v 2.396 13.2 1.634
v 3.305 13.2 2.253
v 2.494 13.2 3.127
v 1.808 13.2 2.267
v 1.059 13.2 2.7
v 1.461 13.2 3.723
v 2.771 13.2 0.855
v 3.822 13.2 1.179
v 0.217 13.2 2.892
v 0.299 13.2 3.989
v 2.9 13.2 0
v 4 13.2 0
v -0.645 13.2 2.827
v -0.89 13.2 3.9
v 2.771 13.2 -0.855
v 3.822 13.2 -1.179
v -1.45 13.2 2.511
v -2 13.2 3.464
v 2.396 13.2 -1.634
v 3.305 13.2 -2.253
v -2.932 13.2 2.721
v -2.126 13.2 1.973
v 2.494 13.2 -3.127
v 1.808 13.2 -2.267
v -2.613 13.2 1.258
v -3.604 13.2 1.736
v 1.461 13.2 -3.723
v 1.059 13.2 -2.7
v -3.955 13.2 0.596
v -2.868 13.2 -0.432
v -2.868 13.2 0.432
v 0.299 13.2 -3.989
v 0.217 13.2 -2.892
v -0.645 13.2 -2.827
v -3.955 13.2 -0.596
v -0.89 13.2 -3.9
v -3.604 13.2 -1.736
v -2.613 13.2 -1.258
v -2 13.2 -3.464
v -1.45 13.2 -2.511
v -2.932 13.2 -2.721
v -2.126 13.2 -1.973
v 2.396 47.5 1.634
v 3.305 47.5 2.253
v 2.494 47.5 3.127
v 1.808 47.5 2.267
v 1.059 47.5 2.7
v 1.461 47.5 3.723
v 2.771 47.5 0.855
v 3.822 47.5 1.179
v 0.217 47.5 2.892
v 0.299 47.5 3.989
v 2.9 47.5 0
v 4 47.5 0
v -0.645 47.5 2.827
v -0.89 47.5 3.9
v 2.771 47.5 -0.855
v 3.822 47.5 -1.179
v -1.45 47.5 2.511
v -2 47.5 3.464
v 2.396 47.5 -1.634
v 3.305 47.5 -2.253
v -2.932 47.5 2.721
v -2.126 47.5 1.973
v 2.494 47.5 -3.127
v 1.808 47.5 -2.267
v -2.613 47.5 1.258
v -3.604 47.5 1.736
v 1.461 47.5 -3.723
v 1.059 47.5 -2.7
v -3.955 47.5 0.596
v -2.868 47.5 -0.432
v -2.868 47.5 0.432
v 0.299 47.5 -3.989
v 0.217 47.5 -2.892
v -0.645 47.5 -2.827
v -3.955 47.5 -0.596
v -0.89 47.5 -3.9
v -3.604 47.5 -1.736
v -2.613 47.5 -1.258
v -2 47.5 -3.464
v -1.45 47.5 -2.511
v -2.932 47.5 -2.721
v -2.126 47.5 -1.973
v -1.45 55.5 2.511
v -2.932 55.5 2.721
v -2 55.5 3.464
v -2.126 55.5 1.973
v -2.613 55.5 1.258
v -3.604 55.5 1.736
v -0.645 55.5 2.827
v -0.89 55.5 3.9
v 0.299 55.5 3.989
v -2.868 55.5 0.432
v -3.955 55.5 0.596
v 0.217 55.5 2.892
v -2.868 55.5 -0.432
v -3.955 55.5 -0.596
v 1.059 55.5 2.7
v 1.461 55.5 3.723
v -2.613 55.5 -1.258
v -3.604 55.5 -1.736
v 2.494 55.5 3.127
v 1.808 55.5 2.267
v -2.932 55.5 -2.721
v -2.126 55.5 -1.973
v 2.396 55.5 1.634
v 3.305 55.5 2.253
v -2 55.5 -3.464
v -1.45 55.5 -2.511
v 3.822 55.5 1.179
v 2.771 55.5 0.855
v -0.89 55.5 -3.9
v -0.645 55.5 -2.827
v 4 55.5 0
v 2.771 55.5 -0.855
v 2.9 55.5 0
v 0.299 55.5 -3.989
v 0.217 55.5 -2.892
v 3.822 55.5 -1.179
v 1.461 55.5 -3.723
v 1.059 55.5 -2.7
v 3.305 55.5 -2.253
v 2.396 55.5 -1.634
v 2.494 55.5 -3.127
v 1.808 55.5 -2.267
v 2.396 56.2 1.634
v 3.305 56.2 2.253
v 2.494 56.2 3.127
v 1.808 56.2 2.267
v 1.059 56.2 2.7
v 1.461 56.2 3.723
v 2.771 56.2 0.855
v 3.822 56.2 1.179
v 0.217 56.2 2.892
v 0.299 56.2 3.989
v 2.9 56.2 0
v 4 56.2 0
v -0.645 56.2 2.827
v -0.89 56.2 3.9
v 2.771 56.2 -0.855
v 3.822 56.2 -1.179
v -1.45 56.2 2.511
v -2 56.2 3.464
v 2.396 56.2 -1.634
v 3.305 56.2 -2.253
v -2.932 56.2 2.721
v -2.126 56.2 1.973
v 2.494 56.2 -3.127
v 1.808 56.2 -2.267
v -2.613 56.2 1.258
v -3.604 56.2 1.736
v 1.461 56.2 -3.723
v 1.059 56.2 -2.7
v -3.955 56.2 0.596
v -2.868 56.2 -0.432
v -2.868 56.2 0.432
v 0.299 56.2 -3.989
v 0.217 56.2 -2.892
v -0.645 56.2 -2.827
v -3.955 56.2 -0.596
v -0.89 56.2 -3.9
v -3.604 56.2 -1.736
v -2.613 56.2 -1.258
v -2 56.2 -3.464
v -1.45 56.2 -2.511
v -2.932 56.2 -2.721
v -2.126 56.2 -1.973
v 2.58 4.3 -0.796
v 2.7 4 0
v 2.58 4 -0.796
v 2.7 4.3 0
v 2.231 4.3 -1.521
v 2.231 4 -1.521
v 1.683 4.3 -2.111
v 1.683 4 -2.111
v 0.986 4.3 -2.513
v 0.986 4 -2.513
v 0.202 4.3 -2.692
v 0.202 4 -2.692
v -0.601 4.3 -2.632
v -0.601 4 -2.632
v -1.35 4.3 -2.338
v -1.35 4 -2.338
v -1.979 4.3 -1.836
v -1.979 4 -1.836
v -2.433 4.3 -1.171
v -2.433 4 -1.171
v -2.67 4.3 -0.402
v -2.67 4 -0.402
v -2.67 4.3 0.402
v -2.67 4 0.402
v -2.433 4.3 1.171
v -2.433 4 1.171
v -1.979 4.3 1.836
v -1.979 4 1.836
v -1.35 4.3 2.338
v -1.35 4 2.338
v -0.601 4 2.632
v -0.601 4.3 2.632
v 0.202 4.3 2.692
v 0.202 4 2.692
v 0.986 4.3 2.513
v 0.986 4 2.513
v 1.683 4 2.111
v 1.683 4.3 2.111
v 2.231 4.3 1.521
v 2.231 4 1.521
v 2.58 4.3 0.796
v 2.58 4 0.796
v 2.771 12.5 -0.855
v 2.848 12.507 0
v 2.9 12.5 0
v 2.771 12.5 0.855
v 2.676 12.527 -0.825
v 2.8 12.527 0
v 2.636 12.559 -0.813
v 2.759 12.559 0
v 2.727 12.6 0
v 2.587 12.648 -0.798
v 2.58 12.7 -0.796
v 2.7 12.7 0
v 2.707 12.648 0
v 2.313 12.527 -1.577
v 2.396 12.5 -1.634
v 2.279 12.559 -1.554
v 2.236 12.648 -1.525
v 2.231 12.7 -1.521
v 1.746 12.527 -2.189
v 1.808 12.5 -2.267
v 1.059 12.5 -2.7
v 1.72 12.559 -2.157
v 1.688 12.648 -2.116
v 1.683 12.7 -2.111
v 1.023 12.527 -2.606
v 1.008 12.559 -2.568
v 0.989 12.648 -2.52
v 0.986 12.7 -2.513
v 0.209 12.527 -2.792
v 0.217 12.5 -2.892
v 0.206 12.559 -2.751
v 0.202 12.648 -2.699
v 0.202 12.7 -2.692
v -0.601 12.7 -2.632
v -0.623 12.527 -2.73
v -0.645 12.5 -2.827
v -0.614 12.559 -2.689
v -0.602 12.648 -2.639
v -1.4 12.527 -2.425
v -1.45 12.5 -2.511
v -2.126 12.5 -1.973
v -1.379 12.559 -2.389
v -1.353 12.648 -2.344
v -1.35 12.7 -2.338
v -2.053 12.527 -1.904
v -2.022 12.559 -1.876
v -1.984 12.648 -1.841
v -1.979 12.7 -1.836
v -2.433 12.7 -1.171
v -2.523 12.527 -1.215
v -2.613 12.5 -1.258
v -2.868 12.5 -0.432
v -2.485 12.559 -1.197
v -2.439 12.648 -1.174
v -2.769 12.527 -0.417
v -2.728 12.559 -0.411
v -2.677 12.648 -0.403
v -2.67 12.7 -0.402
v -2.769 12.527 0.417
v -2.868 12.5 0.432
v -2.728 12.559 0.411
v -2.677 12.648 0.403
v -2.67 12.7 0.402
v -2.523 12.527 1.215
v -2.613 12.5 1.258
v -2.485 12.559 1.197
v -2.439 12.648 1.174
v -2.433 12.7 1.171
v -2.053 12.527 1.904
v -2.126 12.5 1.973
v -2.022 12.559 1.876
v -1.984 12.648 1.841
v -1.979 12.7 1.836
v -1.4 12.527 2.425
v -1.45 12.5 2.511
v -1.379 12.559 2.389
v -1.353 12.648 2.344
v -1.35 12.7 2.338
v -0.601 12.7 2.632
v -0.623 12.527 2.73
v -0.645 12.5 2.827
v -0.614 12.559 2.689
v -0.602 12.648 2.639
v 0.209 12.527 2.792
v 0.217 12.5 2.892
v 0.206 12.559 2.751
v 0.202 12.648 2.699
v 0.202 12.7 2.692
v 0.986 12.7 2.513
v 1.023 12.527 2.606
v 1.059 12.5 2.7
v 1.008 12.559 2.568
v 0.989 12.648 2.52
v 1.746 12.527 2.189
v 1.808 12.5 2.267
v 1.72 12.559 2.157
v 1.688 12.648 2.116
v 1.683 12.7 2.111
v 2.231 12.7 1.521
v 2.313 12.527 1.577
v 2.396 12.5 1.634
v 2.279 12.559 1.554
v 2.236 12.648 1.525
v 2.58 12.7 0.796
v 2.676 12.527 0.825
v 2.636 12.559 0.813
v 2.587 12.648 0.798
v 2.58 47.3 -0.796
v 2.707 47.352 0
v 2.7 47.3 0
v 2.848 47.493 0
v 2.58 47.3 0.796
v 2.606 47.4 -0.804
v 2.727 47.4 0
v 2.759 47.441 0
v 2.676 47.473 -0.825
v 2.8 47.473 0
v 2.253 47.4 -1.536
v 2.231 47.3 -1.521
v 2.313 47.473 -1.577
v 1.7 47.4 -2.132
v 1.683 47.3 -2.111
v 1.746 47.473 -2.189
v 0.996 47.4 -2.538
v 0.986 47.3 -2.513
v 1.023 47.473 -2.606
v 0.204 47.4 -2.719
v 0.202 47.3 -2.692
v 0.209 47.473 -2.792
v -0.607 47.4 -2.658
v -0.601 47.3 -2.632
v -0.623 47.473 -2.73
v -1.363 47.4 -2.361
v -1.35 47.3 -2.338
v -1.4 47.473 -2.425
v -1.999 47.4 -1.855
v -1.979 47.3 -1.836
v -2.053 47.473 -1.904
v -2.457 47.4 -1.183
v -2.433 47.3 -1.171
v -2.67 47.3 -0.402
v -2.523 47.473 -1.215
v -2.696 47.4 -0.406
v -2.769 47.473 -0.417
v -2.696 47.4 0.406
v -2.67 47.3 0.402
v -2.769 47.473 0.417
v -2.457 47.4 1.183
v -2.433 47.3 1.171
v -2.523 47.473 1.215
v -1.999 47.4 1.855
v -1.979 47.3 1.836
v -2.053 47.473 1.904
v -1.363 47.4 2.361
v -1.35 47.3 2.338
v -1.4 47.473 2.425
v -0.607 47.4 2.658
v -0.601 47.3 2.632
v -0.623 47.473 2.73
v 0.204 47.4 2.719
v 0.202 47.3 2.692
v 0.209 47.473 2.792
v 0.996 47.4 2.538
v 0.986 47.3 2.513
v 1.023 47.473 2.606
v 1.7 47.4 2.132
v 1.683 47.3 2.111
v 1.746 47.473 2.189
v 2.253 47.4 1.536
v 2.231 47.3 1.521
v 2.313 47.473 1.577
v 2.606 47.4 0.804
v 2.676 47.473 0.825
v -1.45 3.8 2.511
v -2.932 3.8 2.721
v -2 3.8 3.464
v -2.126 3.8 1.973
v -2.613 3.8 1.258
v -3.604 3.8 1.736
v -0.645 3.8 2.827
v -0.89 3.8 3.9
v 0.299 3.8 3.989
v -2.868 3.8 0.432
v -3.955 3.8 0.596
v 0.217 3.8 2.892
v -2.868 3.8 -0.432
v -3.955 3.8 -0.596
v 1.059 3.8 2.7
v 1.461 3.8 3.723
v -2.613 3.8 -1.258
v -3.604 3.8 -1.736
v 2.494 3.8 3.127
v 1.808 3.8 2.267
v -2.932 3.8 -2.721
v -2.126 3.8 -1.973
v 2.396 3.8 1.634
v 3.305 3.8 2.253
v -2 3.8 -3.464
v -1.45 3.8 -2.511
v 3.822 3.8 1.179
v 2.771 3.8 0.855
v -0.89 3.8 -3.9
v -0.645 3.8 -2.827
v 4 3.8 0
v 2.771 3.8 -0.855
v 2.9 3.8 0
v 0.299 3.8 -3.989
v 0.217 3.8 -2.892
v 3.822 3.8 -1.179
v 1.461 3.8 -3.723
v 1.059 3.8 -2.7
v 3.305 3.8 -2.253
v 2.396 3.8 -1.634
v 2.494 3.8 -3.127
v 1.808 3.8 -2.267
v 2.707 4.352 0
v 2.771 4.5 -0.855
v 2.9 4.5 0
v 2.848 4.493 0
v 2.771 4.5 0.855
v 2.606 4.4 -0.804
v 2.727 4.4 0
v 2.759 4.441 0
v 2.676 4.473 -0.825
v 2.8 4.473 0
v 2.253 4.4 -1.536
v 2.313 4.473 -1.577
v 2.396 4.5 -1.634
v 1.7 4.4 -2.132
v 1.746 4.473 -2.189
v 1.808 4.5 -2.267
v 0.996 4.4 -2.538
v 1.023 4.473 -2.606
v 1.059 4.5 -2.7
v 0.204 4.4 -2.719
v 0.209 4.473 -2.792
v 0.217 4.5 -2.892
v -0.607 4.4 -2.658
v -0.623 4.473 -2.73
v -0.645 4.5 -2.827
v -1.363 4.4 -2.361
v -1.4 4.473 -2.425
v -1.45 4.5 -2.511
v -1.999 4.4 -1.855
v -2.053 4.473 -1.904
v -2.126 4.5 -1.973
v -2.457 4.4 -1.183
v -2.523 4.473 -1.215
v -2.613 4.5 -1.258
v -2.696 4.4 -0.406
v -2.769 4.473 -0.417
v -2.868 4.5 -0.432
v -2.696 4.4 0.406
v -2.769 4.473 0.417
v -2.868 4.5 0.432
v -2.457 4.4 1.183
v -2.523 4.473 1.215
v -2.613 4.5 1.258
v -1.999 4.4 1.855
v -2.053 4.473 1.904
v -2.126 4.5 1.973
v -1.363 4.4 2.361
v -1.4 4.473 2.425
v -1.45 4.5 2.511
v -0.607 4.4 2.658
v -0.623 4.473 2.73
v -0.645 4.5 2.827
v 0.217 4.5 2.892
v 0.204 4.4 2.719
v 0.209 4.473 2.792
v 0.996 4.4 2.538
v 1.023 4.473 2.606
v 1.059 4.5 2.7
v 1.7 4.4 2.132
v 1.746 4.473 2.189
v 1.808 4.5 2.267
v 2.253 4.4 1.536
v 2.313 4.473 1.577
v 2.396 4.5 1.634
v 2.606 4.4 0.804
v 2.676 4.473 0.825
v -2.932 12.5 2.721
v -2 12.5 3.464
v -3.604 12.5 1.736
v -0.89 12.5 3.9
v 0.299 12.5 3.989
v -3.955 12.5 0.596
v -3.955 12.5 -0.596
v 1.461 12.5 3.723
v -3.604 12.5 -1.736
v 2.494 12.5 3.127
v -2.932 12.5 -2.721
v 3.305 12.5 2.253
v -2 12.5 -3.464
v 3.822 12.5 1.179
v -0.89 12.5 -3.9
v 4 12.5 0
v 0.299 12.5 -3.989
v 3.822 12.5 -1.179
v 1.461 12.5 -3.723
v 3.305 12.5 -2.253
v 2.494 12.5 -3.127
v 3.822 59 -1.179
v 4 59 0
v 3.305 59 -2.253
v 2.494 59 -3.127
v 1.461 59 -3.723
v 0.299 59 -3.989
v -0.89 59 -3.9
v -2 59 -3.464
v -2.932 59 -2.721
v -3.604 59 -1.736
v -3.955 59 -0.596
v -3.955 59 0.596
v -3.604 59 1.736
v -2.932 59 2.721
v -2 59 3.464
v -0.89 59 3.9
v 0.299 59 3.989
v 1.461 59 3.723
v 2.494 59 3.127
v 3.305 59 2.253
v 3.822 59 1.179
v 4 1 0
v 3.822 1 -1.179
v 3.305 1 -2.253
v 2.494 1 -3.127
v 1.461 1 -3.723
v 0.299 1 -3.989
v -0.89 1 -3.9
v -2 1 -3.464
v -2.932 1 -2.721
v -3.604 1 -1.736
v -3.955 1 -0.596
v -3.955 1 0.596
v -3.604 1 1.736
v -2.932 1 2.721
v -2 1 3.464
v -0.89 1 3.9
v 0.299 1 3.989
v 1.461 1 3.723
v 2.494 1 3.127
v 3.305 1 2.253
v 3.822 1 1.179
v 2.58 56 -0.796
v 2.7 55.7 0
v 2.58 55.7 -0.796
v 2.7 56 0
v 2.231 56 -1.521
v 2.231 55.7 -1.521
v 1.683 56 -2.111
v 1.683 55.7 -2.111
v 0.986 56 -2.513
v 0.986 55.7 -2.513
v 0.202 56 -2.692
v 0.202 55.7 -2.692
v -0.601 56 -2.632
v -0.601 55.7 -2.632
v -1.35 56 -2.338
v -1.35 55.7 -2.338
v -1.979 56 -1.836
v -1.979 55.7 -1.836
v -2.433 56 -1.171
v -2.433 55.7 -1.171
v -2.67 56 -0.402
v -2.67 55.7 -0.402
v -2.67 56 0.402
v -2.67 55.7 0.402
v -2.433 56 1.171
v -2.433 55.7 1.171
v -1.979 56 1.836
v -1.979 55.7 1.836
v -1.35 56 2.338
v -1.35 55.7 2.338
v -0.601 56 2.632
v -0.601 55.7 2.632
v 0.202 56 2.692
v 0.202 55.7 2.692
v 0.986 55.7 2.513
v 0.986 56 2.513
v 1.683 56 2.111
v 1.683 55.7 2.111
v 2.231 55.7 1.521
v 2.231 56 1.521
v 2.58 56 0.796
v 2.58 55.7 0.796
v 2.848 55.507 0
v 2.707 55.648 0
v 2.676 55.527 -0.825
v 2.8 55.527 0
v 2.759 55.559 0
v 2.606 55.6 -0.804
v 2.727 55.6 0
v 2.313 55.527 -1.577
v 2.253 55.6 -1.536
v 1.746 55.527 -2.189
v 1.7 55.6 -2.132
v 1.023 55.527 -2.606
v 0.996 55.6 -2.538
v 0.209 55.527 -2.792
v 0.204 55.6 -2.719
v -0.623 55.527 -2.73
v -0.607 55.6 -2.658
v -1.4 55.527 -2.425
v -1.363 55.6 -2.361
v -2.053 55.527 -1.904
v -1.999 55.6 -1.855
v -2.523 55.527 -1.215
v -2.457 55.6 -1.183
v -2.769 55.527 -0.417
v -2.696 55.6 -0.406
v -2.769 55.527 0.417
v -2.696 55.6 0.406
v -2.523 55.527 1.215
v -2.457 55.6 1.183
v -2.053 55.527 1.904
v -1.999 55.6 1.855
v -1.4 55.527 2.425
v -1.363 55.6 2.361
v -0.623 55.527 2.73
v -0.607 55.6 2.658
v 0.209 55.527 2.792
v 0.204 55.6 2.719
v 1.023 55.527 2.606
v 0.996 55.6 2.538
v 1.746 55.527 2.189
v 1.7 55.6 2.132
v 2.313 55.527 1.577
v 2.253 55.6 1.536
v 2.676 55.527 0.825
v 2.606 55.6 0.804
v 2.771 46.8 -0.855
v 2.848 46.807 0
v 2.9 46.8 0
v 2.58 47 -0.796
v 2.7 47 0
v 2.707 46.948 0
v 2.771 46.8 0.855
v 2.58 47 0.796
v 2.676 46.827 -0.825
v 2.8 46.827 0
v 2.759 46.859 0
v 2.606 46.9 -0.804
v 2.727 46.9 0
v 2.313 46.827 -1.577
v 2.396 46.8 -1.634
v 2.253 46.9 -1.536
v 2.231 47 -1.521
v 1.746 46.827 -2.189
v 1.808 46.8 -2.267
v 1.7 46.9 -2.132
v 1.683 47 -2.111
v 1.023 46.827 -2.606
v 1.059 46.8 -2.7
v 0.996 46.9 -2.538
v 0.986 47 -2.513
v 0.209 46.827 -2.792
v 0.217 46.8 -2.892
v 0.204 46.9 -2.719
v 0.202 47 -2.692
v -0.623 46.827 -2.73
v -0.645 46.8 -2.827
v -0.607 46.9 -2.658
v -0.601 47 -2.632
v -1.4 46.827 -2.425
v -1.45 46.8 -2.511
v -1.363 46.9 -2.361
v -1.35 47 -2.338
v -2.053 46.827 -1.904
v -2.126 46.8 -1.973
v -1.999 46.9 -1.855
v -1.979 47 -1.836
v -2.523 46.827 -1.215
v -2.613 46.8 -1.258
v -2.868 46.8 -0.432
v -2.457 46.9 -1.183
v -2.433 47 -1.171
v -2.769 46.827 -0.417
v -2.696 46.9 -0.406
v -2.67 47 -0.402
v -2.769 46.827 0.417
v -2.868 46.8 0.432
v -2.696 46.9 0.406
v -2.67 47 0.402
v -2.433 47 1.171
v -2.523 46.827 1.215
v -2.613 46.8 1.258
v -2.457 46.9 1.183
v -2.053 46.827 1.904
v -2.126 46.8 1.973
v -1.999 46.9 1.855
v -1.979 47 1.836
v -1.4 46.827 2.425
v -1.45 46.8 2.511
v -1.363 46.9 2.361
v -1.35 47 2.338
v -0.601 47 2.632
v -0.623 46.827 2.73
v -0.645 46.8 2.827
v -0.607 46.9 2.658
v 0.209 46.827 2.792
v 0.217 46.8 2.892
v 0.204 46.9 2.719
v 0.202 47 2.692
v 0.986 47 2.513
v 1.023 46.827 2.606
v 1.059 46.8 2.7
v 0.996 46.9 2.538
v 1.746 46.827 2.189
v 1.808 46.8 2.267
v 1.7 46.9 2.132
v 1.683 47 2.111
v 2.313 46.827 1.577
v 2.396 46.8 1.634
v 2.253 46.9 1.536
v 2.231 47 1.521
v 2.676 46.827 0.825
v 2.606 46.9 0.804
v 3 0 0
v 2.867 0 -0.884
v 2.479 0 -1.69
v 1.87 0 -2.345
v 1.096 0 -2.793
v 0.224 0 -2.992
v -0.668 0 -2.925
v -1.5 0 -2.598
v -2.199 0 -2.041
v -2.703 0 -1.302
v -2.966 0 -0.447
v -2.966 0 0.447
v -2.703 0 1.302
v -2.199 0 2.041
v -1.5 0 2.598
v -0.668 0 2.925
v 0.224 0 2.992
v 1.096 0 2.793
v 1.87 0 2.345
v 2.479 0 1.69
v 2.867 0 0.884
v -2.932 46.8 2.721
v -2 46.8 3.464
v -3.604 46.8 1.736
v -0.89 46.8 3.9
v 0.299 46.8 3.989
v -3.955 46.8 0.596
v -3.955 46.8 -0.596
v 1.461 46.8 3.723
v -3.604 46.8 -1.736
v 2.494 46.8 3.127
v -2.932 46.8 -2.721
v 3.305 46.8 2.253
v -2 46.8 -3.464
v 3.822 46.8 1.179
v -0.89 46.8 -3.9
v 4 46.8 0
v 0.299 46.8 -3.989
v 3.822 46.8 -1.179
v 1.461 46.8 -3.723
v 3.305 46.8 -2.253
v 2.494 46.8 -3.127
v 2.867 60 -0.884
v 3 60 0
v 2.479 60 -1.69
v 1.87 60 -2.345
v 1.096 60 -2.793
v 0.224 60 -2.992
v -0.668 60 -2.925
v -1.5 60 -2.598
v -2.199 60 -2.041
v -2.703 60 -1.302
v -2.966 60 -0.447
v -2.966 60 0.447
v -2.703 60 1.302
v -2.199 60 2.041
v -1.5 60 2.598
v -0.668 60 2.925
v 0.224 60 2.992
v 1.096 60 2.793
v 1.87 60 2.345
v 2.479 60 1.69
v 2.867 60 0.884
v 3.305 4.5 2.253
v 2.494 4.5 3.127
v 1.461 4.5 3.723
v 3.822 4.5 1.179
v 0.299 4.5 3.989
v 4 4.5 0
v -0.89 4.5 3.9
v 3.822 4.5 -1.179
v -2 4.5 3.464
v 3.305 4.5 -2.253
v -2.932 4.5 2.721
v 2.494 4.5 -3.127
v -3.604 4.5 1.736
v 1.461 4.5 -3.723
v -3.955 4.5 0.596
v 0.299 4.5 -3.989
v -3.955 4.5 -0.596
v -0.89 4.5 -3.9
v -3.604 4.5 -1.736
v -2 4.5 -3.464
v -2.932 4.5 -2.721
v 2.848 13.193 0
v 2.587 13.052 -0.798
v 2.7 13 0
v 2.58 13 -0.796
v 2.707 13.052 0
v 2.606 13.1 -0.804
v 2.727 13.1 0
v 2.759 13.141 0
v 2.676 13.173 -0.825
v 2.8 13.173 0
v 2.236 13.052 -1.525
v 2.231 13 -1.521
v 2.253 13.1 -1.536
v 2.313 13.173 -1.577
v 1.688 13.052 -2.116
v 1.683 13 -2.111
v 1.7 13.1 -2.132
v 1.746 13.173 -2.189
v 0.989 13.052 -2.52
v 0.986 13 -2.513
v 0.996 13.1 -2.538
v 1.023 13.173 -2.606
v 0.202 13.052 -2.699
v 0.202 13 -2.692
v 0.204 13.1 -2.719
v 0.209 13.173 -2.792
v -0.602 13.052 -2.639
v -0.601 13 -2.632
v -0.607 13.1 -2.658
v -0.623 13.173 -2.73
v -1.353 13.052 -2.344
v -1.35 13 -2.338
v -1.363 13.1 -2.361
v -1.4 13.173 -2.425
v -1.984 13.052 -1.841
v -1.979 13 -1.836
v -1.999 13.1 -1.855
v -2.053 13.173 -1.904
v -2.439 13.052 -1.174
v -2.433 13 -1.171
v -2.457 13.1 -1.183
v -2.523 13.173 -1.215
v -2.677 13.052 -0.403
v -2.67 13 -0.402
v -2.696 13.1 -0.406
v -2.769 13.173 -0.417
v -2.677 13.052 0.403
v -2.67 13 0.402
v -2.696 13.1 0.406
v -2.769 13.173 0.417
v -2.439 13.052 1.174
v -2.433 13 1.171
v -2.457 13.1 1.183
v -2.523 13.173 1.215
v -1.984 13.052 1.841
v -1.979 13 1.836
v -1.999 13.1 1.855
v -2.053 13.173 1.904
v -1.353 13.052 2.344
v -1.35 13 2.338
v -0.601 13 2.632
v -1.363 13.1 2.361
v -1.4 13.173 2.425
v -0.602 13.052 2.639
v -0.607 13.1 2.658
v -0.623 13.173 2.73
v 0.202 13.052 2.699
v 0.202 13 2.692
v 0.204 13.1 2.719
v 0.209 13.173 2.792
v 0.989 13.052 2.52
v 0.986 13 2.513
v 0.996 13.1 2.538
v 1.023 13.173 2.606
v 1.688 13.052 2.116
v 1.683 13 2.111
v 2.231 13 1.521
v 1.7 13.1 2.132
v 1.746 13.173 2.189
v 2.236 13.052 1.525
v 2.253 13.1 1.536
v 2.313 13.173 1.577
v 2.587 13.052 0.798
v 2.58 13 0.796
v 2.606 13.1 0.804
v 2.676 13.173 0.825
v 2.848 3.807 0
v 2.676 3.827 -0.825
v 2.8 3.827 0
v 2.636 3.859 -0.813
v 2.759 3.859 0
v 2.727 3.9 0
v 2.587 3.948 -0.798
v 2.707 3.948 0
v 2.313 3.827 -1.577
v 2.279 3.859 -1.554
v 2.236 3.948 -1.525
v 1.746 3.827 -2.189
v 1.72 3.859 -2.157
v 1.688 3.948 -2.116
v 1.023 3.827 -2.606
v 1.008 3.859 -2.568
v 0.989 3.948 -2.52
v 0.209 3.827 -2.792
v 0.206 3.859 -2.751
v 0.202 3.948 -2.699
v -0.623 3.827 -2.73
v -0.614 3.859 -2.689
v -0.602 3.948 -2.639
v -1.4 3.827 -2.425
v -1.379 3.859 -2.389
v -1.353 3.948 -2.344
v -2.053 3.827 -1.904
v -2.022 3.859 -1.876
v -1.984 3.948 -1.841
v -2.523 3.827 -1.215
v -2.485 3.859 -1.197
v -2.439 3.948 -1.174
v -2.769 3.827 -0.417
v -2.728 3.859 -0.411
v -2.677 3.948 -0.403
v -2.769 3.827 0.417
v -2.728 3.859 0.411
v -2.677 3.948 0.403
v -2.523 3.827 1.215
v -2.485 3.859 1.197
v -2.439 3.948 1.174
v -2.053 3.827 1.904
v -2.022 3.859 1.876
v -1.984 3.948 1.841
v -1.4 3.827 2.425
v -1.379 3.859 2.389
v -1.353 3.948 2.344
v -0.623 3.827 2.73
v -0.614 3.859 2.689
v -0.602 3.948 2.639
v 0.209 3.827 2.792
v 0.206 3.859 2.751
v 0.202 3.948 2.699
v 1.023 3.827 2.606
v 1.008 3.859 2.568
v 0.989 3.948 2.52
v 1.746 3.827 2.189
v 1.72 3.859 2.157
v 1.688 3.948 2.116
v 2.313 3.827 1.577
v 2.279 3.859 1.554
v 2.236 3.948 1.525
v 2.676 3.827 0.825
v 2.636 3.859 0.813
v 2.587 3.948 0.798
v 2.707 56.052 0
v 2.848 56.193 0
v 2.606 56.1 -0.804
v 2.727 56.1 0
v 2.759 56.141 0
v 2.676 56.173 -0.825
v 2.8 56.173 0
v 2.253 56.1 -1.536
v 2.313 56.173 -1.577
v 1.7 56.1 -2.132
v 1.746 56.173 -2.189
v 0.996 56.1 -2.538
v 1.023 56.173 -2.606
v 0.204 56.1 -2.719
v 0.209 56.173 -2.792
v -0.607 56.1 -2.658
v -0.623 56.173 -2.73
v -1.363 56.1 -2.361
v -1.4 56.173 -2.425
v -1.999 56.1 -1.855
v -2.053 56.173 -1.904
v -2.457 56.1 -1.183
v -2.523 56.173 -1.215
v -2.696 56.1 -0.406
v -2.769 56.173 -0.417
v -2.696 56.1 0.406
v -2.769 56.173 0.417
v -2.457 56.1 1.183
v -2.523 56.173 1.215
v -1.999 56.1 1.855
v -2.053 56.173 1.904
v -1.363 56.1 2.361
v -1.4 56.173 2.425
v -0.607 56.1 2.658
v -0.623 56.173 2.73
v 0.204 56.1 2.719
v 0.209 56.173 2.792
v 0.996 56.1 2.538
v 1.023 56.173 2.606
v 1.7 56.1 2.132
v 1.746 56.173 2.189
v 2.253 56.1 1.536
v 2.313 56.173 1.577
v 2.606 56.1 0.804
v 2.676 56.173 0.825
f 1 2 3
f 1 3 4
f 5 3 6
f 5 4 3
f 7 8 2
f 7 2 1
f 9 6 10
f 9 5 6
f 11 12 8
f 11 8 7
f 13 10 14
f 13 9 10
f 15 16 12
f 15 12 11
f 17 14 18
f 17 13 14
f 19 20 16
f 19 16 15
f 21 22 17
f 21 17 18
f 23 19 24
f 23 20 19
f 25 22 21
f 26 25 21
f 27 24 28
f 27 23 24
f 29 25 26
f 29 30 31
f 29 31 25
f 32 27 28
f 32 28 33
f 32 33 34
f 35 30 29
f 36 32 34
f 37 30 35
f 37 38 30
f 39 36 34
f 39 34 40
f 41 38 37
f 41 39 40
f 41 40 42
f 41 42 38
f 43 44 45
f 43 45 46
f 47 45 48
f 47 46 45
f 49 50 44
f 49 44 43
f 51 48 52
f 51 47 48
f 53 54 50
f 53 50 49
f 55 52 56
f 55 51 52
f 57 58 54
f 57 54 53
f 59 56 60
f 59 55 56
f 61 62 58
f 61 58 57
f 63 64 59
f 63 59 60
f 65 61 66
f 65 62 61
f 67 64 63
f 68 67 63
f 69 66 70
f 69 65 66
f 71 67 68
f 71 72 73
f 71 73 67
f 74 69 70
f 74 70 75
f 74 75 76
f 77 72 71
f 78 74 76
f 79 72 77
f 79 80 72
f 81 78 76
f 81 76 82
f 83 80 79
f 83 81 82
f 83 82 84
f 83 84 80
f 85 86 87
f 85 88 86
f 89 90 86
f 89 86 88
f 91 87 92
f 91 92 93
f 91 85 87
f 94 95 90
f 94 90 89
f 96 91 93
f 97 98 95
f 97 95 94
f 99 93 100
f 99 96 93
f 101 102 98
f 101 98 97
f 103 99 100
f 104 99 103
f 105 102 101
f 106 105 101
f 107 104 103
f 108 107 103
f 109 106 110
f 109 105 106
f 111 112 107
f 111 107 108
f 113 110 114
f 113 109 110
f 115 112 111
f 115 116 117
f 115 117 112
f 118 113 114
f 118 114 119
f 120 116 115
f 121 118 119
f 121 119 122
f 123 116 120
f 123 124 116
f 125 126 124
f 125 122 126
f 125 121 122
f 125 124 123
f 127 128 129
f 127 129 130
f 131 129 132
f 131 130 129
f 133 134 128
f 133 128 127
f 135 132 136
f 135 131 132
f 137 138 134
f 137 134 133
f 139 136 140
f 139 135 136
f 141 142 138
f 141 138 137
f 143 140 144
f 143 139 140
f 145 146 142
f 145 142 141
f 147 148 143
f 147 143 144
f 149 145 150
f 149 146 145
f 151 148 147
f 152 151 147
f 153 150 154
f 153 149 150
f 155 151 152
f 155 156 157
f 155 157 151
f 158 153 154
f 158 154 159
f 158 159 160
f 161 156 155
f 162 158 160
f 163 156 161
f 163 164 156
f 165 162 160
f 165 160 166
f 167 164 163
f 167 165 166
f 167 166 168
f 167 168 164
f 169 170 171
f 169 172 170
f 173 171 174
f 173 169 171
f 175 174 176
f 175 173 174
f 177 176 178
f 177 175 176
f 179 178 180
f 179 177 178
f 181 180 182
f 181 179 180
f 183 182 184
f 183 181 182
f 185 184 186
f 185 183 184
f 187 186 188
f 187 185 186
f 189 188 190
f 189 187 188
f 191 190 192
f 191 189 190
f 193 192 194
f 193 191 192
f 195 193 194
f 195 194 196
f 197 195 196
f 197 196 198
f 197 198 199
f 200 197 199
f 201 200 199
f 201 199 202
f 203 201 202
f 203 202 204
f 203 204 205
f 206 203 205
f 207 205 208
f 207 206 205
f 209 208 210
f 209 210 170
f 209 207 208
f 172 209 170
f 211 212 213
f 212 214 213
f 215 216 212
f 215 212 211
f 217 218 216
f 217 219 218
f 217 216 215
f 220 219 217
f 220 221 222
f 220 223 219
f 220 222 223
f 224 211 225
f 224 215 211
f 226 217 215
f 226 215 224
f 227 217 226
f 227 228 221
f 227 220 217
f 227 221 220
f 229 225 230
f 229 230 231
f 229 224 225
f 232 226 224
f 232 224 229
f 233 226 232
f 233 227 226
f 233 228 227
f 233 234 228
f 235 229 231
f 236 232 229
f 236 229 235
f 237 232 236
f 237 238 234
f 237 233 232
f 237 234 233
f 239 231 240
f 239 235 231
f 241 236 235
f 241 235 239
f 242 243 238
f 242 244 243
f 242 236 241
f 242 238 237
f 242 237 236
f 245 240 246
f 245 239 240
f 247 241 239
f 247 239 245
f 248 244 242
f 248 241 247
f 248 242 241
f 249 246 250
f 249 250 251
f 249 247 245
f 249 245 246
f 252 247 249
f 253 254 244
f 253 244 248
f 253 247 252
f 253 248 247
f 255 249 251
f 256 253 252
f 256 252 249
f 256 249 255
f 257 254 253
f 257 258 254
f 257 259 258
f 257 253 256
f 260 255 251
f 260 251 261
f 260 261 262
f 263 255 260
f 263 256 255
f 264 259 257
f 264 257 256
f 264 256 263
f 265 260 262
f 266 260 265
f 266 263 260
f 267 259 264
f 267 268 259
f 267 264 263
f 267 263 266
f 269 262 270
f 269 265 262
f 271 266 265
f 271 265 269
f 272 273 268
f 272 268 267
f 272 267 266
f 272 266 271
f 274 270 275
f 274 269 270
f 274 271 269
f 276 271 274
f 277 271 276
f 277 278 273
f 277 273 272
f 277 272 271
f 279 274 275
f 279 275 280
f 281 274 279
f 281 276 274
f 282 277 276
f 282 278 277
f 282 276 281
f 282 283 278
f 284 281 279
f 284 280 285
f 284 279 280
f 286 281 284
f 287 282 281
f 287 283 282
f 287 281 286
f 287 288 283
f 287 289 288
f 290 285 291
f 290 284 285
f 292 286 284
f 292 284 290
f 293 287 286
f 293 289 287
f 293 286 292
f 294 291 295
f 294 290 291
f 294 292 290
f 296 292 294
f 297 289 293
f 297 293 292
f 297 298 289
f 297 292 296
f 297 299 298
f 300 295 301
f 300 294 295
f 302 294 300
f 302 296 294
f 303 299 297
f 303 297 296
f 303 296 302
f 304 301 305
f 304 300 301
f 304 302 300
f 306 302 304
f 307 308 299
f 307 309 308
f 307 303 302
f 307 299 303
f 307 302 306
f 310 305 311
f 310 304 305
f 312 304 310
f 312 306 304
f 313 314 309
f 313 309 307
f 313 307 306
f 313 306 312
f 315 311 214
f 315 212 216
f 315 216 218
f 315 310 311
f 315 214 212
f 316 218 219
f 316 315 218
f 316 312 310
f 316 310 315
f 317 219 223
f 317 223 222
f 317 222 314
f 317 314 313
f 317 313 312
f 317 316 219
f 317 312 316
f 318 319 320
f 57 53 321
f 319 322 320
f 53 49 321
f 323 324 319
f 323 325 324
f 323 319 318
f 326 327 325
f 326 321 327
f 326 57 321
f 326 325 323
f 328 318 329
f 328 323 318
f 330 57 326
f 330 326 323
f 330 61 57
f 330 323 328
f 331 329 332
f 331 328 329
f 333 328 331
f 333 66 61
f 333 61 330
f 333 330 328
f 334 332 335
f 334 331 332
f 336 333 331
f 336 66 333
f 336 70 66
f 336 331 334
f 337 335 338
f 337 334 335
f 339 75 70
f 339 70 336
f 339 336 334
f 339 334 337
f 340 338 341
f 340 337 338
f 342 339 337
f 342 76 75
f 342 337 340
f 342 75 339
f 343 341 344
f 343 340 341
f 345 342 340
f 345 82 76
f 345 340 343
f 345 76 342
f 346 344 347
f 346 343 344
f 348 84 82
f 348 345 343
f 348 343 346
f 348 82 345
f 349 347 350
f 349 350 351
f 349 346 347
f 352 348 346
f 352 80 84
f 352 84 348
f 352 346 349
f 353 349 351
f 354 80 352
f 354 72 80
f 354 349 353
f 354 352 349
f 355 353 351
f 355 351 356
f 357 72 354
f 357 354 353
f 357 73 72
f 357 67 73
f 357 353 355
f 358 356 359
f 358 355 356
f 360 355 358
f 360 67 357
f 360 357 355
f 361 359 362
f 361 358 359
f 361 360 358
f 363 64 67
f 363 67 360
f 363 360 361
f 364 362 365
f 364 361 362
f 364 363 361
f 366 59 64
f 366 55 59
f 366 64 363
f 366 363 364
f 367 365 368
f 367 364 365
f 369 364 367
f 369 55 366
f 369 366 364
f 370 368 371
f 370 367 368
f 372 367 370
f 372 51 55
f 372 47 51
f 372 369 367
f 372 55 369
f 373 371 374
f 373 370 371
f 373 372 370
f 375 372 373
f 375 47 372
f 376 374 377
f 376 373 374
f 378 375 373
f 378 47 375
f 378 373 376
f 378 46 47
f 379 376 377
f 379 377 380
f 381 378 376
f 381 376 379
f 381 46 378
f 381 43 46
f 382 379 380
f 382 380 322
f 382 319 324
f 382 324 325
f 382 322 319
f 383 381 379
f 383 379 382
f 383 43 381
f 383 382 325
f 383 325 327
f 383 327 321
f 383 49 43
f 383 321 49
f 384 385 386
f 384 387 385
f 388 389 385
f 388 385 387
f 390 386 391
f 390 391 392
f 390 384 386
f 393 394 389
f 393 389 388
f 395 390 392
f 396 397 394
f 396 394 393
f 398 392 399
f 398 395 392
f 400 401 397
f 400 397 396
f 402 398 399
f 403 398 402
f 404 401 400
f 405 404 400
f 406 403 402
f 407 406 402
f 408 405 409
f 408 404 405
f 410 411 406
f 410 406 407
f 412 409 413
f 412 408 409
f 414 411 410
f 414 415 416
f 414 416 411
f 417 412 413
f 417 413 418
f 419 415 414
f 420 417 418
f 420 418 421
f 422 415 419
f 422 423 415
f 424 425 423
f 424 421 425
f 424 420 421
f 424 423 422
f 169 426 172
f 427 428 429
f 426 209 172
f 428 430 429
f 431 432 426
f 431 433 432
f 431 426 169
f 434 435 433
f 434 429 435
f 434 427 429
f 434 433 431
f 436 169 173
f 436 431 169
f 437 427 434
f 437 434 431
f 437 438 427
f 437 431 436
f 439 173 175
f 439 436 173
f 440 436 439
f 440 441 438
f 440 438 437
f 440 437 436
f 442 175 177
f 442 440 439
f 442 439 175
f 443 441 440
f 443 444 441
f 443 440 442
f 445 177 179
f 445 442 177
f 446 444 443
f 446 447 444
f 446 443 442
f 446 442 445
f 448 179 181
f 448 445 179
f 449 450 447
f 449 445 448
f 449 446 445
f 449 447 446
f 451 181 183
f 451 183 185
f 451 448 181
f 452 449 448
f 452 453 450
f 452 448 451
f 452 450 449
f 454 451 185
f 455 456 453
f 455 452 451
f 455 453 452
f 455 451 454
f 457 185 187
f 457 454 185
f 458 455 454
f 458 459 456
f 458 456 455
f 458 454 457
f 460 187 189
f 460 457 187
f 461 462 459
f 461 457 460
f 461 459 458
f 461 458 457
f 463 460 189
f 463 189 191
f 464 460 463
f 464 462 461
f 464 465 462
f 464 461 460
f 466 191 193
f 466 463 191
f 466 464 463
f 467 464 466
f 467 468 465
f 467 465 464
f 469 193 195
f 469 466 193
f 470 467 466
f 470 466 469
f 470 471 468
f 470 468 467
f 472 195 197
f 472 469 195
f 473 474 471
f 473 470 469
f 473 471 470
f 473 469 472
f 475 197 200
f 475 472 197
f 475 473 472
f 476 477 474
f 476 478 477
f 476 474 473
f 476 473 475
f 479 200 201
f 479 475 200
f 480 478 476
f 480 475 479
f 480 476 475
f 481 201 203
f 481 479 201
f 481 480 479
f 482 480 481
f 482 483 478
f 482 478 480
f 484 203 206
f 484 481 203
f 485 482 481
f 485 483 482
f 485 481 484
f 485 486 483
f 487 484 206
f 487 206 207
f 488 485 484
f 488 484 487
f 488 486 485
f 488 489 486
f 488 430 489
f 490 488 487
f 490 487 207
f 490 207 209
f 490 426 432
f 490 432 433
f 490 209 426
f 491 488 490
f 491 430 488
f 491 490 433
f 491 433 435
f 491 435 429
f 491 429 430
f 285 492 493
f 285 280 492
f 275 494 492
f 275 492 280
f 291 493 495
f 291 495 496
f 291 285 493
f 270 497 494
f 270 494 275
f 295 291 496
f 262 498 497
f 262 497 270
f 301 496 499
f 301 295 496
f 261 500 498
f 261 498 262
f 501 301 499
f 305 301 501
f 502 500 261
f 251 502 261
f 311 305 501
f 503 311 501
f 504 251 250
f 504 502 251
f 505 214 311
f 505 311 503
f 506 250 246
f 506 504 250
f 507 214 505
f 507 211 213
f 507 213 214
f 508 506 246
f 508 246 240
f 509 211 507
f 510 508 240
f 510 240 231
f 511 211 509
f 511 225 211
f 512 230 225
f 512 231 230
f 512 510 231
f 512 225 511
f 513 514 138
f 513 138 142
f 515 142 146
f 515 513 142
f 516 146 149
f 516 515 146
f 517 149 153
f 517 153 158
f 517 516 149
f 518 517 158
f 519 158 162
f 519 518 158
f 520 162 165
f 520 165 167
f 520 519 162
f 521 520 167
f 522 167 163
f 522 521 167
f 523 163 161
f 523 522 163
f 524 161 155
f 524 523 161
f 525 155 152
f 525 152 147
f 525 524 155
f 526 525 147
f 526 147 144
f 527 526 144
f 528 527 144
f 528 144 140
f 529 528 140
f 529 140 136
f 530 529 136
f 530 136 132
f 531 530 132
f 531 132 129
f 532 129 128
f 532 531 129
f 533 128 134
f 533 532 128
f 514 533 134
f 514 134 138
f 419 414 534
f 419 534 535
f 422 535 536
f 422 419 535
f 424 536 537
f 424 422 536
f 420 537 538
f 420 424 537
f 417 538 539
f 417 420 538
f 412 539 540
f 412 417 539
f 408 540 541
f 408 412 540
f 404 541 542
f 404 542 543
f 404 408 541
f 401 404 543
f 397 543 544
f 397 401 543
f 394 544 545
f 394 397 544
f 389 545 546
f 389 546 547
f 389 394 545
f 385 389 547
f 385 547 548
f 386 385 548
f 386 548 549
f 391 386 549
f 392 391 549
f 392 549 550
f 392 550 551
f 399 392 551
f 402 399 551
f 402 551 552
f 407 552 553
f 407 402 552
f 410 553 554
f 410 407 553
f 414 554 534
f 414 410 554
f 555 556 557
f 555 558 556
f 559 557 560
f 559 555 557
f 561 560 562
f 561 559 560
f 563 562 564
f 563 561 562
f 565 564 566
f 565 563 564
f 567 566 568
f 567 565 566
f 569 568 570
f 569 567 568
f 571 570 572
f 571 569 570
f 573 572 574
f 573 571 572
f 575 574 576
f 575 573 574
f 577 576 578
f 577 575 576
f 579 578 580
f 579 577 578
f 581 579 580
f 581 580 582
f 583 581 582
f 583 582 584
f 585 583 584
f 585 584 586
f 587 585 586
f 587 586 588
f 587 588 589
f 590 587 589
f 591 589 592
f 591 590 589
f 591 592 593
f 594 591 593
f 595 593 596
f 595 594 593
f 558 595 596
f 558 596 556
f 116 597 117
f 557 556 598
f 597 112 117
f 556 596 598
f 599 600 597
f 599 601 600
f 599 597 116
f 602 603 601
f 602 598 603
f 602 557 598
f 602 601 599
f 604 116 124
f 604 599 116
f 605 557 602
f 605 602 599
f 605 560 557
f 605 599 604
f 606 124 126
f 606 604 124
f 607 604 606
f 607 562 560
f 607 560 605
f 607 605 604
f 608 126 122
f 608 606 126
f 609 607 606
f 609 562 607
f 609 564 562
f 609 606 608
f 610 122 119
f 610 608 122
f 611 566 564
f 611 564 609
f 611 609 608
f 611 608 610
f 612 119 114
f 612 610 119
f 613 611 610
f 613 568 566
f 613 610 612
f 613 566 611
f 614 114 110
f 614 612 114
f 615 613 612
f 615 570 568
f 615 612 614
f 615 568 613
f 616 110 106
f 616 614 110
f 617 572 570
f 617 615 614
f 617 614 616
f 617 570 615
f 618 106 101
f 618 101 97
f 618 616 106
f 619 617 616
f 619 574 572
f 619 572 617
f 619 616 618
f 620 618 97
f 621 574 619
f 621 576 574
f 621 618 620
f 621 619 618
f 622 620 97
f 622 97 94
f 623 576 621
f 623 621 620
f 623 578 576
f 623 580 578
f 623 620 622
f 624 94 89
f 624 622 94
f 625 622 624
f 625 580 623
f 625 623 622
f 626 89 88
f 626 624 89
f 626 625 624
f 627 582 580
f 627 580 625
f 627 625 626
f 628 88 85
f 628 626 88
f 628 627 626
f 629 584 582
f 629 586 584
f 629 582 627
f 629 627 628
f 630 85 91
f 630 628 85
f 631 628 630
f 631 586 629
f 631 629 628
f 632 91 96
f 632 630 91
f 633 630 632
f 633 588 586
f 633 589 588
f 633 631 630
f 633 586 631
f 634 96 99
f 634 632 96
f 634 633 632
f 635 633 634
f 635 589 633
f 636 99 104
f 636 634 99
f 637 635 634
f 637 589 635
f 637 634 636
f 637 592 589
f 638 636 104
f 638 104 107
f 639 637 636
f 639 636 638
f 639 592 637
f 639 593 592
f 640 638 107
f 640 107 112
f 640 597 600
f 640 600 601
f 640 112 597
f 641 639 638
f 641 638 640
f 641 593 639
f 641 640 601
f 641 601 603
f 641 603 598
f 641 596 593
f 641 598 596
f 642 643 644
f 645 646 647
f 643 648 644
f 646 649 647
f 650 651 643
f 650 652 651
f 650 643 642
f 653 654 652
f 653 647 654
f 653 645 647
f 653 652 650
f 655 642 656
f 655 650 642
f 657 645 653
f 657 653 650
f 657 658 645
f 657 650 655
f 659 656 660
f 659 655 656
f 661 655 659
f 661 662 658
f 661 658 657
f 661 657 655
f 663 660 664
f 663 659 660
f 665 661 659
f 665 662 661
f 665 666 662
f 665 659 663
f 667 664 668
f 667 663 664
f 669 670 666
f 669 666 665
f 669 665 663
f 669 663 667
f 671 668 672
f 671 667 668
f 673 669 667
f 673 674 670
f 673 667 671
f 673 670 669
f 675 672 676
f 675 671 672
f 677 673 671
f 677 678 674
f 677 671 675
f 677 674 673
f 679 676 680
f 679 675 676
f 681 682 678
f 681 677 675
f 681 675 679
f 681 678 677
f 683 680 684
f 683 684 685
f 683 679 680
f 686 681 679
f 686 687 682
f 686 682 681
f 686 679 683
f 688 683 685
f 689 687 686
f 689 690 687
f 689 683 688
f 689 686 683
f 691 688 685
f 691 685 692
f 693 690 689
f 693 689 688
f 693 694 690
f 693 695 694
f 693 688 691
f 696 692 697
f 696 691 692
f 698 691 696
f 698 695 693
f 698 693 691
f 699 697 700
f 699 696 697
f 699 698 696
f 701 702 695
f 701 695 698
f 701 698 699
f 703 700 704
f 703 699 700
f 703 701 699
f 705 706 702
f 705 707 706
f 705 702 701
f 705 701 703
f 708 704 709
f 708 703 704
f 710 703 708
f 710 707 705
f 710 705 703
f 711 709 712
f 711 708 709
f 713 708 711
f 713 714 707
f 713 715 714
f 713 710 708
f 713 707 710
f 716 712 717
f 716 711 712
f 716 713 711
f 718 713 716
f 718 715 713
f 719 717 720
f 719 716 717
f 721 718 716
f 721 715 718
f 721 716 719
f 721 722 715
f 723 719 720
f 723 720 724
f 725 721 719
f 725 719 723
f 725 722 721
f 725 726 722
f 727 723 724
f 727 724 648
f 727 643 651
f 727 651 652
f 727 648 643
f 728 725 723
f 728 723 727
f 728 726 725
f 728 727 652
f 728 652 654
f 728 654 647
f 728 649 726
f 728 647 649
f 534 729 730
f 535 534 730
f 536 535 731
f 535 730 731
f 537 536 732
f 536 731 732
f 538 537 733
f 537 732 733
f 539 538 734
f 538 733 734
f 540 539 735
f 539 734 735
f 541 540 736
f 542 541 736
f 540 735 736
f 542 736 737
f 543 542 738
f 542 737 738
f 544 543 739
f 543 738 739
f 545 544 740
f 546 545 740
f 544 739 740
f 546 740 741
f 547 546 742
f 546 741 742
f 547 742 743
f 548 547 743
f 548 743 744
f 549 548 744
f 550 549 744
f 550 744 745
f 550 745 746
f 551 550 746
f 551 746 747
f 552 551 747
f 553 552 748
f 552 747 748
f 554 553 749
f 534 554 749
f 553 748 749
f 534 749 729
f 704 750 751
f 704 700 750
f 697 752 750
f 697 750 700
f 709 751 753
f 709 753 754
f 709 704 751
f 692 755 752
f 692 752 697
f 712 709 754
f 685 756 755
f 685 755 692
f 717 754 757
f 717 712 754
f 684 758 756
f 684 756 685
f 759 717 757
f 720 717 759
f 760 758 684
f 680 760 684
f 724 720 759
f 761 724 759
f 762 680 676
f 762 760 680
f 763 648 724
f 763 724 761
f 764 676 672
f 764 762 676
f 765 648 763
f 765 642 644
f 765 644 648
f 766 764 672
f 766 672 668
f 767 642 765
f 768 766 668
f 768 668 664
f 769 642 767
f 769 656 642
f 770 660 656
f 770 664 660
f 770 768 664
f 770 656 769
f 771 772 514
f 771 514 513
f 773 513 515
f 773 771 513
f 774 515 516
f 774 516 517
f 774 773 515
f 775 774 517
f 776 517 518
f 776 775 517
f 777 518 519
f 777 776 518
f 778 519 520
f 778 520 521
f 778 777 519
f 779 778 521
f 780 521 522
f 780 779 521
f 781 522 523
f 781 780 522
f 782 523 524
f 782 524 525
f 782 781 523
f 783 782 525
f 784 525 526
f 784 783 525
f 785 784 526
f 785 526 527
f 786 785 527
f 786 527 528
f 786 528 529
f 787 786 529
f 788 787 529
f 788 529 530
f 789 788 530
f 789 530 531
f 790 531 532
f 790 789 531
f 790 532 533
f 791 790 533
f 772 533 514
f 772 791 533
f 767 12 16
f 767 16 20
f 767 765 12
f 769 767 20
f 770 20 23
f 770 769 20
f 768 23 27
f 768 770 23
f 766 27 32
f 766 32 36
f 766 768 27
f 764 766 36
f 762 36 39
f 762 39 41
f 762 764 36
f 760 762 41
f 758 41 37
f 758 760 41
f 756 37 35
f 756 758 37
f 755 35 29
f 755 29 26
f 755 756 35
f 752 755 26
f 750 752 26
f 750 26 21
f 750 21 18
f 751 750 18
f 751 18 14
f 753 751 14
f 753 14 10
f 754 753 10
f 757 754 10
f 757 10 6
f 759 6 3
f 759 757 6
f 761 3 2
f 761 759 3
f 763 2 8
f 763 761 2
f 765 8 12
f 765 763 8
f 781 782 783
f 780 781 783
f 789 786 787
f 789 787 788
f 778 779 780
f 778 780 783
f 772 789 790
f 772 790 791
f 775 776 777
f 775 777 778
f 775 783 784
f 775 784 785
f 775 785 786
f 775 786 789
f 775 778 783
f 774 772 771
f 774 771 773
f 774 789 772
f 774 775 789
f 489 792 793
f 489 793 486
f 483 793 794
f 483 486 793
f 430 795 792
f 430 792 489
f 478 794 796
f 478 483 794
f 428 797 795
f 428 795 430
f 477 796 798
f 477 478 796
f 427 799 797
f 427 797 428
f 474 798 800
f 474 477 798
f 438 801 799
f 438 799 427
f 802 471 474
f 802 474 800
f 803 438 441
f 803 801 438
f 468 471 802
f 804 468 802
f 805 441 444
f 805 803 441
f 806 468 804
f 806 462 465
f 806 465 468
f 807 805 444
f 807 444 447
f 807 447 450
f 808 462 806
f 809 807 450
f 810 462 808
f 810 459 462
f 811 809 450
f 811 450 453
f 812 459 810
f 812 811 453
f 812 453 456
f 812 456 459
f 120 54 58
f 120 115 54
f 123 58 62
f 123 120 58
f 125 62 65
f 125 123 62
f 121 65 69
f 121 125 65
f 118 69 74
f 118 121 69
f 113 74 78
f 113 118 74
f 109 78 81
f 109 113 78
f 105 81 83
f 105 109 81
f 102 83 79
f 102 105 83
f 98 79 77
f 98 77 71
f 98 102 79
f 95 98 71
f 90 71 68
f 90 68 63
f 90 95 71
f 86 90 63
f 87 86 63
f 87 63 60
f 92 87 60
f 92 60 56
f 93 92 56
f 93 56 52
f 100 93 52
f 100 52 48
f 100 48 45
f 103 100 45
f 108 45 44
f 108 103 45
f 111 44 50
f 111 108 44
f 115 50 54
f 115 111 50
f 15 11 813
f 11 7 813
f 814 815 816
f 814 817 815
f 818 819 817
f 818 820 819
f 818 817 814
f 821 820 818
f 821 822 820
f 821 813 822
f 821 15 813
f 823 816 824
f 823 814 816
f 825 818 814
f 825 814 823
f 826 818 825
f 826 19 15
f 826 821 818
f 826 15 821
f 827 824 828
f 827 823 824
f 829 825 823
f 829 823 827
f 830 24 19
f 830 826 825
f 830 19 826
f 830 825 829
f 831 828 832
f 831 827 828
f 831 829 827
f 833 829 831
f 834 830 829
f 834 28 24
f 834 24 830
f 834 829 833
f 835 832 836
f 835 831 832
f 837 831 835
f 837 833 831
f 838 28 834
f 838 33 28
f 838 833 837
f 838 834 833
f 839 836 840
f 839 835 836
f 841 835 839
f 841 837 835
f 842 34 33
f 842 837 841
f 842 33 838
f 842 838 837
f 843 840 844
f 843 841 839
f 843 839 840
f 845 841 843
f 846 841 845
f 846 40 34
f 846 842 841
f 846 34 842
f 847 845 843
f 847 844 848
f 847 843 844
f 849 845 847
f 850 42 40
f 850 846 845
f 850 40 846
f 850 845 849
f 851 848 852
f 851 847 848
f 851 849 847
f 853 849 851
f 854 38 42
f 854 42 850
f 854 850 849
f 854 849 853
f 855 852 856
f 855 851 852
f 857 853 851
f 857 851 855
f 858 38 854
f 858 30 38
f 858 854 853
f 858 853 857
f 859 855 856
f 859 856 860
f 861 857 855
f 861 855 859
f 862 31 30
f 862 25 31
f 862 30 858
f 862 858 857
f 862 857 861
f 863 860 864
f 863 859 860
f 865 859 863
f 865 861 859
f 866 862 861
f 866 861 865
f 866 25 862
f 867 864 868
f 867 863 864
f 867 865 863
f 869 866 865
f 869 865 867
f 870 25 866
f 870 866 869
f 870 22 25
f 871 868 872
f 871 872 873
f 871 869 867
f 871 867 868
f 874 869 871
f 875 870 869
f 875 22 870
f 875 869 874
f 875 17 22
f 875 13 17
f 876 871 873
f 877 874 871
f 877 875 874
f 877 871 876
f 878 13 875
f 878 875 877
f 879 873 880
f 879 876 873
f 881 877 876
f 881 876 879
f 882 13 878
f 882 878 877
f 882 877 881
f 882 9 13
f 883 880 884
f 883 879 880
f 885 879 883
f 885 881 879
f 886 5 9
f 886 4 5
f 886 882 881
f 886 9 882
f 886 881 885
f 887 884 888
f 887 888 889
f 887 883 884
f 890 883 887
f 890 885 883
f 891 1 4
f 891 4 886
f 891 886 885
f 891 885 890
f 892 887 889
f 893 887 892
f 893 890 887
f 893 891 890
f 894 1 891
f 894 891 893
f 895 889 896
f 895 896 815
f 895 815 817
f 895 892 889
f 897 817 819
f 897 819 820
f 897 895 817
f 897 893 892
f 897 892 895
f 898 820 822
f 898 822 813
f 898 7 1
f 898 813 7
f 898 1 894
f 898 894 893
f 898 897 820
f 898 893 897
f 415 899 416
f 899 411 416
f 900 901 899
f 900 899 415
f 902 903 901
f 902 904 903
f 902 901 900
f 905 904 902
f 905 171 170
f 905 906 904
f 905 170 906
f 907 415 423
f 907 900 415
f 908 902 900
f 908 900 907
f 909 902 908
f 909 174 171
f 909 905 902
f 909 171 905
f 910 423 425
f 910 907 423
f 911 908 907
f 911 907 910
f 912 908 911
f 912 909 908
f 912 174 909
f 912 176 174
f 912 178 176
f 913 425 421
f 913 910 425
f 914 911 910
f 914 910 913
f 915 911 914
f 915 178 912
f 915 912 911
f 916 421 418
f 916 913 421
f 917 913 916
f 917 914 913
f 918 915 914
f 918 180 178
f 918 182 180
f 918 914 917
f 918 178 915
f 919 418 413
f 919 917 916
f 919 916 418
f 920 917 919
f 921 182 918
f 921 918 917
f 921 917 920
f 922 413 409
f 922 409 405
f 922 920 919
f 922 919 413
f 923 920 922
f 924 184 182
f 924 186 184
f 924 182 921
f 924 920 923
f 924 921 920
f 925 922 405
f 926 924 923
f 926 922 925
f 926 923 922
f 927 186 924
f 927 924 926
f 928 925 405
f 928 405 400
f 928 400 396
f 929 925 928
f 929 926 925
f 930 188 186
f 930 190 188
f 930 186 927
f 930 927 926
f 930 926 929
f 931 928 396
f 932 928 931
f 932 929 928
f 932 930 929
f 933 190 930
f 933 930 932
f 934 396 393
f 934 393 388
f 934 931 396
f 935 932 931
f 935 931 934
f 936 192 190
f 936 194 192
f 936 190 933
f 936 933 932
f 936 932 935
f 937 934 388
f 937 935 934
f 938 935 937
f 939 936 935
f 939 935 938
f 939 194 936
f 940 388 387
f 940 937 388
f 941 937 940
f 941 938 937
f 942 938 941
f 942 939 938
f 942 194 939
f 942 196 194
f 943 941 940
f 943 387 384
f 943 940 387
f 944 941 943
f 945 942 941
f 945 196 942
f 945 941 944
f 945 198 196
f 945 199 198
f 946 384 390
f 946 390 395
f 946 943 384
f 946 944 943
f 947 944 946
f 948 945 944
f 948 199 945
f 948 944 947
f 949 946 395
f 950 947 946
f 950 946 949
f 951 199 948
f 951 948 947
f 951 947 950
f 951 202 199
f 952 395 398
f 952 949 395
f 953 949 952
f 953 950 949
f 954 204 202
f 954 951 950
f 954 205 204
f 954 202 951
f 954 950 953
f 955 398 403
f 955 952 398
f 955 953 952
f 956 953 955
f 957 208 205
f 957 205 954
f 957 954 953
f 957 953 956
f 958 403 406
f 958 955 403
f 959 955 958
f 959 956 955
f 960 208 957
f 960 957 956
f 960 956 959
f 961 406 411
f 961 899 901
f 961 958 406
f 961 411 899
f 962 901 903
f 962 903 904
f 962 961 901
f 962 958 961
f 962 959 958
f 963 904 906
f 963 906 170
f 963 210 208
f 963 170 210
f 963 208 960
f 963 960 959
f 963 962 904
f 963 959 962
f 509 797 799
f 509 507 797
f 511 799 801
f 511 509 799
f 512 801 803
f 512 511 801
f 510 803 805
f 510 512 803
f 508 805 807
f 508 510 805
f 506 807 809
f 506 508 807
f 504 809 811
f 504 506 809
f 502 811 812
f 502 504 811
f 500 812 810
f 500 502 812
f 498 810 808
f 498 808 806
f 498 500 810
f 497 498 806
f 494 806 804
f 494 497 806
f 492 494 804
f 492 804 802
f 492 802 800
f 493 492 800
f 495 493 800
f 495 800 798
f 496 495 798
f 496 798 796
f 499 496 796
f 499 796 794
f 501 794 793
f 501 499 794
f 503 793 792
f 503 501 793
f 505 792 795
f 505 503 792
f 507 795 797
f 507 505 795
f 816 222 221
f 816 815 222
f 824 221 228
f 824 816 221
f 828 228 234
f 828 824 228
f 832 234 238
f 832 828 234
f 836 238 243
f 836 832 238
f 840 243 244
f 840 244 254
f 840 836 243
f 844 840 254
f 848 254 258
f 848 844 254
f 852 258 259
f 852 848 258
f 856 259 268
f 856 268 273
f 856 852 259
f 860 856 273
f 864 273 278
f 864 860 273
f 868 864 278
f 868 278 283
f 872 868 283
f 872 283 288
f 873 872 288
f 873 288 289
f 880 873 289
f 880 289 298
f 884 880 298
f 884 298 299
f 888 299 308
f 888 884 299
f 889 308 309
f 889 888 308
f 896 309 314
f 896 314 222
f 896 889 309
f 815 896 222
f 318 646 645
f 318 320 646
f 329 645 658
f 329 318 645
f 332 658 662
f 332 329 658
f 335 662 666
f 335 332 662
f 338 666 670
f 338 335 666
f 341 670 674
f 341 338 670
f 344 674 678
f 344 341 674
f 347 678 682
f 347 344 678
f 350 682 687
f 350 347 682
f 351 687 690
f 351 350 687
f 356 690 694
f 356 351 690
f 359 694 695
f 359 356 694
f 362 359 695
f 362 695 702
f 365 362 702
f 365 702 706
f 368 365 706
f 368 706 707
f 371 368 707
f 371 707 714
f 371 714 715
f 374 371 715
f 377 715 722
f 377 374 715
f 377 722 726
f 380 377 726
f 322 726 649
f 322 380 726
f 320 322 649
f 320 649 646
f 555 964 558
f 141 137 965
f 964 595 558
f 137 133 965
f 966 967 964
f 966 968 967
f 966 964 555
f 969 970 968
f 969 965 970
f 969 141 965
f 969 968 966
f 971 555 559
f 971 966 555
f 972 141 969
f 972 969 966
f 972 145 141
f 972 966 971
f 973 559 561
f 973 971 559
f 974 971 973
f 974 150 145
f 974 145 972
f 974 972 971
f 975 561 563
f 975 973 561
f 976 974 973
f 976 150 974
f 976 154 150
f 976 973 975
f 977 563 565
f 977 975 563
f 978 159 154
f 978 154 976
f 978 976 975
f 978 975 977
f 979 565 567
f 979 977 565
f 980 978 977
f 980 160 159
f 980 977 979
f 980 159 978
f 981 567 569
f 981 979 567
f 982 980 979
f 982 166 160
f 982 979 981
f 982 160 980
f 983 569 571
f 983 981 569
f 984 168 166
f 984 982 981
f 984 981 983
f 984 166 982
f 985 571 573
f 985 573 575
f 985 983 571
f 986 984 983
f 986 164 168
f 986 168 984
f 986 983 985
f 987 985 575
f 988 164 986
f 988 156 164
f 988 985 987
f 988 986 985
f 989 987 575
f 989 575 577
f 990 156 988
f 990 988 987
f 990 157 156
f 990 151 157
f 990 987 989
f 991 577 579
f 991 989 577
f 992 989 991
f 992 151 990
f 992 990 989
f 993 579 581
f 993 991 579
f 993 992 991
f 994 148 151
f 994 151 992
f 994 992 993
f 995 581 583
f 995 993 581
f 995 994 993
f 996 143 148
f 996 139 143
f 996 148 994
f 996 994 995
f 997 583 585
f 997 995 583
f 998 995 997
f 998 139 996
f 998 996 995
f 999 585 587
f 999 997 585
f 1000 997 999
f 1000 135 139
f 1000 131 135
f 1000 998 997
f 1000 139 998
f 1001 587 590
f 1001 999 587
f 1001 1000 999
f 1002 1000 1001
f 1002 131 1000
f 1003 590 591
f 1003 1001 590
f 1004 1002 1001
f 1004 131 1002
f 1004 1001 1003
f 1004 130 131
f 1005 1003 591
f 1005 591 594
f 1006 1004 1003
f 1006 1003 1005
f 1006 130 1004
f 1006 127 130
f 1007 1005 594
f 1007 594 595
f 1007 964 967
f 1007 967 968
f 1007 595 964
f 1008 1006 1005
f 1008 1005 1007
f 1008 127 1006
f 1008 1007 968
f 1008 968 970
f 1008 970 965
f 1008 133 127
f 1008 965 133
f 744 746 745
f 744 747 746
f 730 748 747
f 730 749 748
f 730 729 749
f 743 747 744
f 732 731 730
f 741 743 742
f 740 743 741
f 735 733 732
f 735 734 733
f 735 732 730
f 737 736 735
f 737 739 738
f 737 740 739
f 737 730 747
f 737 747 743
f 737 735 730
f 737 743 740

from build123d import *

# Parameters (mm, degrees)
CHAMFER1_SIZE = 1


with BuildPart() as part:
    # Sketch1 → Revolve2 (revolve)
    with BuildSketch(Plane.XY):
        with BuildLine():
            Line((4, 0), (4, 3.8))
            Line((4, 3.8), (2.9, 3.8))
            ThreePointArc((2.9, 3.8), (2.758578644, 3.858578644), (2.7, 4))
            Line((2.7, 4), (2.7, 4.3))
            ThreePointArc((2.7, 4.3), (2.758578644, 4.441421356), (2.9, 4.5))
            Line((2.9, 4.5), (4, 4.5))
            Line((4, 4.5), (4, 12.5))
            Line((4, 12.5), (2.9, 12.5))
            ThreePointArc((2.9, 12.5), (2.758578644, 12.558578644), (2.7, 12.7))
            Line((2.7, 12.7), (2.7, 13))
            ThreePointArc((2.7, 13), (2.758578644, 13.141421356), (2.9, 13.2))
            Line((2.9, 13.2), (4, 13.2))
            Line((4, 13.2), (4, 46.8))
            Line((4, 46.8), (2.9, 46.8))
            ThreePointArc((2.9, 46.8), (2.758578644, 46.858578644), (2.7, 47))
            Line((2.7, 47), (2.7, 47.3))
            ThreePointArc((2.7, 47.3), (2.758578644, 47.441421356), (2.9, 47.5))
            Line((2.9, 47.5), (4, 47.5))
            Line((4, 47.5), (4, 55.5))
            Line((4, 55.5), (2.9, 55.5))
            ThreePointArc((2.9, 55.5), (2.758578644, 55.558578644), (2.7, 55.7))
            Line((2.7, 55.7), (2.7, 56))
            ThreePointArc((2.7, 56), (2.758578644, 56.141421356), (2.9, 56.2))
            Line((2.9, 56.2), (4, 56.2))
            Line((4, 56.2), (4, 60))
            Line((4, 60), (0, 60))
            Line((0, 60), (0, 0))
            Line((0, 0), (4, 0))
        make_face()
    revolve(axis=Axis((0, 0, 0), (0, 1, 0)))

    # Chamfer1
    chamfer1_edges = [part.edges().sort_by_distance(p)[0] for p in [
        (-4, 60, 0),
        (-4, 0, 0),
    ]]
    chamfer(chamfer1_edges, length=CHAMFER1_SIZE)


solid = part.part
